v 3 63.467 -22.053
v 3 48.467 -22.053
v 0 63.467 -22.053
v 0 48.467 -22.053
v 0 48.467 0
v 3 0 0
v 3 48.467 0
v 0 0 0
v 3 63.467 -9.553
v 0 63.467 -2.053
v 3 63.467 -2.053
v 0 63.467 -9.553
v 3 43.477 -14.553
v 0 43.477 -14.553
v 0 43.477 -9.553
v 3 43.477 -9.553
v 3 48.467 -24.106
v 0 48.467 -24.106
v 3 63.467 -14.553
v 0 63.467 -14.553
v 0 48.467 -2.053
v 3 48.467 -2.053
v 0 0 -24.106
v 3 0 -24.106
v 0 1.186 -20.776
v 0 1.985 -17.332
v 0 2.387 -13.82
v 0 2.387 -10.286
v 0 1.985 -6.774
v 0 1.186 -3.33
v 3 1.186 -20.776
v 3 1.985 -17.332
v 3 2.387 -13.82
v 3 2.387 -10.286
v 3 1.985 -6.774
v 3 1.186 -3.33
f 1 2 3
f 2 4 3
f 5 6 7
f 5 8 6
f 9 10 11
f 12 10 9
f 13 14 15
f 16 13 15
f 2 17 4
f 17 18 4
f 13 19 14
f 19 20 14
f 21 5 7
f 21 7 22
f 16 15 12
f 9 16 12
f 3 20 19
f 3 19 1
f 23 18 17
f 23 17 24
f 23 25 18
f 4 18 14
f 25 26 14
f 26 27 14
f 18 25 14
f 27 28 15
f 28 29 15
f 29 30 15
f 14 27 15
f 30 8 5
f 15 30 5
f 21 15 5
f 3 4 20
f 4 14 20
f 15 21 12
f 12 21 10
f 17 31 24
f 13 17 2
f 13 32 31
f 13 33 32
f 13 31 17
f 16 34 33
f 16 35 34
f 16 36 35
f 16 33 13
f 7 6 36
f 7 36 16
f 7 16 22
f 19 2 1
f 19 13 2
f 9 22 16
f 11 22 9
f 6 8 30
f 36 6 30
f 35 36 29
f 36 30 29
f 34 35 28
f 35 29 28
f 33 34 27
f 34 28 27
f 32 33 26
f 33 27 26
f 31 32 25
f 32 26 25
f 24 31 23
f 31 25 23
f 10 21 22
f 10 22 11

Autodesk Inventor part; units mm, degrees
ref_plane "YZ Plane" through (0, 0, 0) normal (1, 0, 0) x (0, 1, 0)
ref_plane "XZ Plane" through (0, 0, 0) normal (0, 1, 0) x (-1, 0, 0)
ref_plane "XY Plane" through (0, 0, 0) normal (0, 0, 1) x (1, 0, 0)
sketch "Sketch1" plane through (0, 0, 0) normal (1, 0, 0) x (0, 1, 0)
  circle A0 centre (-58.6732, 0) radius 31.02 construction
  line L0 (-39.6195, 0) -> (-14.1298, -32.6253) construction
  line L1 (-30.13, -12.146) -> (-30.13, 12.146) construction
  line L2 (0, 0) -> (-214.2426, 0) construction
  line L3 (-30.13, 12.146) -> (-33.107, -11.7755)
  line L4 (-33.107, -11.7755) -> (-30.13, -12.146)
  line L5 (-30.13, -12.146) -> (-27.153, 11.7755)
  line L6 (-27.153, 11.7755) -> (-30.13, 12.146)
  line L7 (-30.13, 12.146) -> (-30.13, -12.146) construction
  line L8 (-33.107, -11.7755) -> (-27.153, 11.7755) construction
  point P0 (-30.13, 0)
  dimension "d0" = 62.04
  dimension "d2" = 52
  dimension "d3" = 24.292
  dimension "d8" = 31.2206
  dimension "d9" = 16.0002
  dimension "d11" = 3
  dimension "d13" = 24.106
sketch "Sketch2" plane through (0, 0, 0) normal (1, 0, 0) x (0, 1, 0)
  line L0 (0, 0) -> (63.4666, 0)
  line L1 (63.4666, 0) -> (63.4666, -24.106)
  line L2 (63.4666, -24.106) -> (0, -24.106)
  line L3 (0, -24.106) -> (0, 0) construction
  line L4 (63.4666, -12.053) -> (-45.5912, -12.053) construction
  arc A0 (0, -24.106) -> (0, 0) centre (-28.5826, -12.053) ccw
  arc A1 (0, 0) -> (0, -24.106) centre (-28.5826, -12.053) ccw construction
  line L5 (80.4558, -9.553) -> (46.4774, -9.553) construction
  line L6 (46.4774, -9.553) -> (46.4774, -14.553) construction
  line L7 (46.4774, -14.553) -> (80.4558, -14.553) construction
  line L8 (80.4558, -14.553) -> (80.4558, -9.553) construction
  line L9 (80.4558, -9.553) -> (46.4774, -14.553) construction
  line L10 (46.4774, -9.553) -> (80.4558, -14.553) construction
  line L11 (43.4774, -9.553) -> (83.4558, -9.553)
  line L12 (83.4558, -9.553) -> (83.4558, -14.553) construction
  line L13 (83.4558, -14.553) -> (43.4774, -14.553)
  line L14 (43.4774, -14.553) -> (43.4774, -9.553)
  line L15 (43.4774, -9.553) -> (83.4558, -14.553) construction
  line L16 (83.4558, -9.553) -> (43.4774, -14.553) construction
  line L17 (78.4666, -26.1591) -> (48.4666, -26.1591)
  line L18 (48.4666, -26.1591) -> (48.4666, -22.053)
  line L19 (48.4666, -22.053) -> (78.4666, -22.053)
  line L20 (78.4666, -22.053) -> (78.4666, -26.1591)
  line L21 (78.4666, -26.1591) -> (48.4666, -22.053) construction
  line L22 (48.4666, -26.1591) -> (78.4666, -22.053) construction
  line L23 (48.4666, 2.053) -> (48.4666, -2.053)
  line L24 (48.4666, -2.053) -> (78.4666, -2.053)
  point P0 (63.4666, -9.553)
  point P1 (63.4666, -2.053)
  point P2 (48.4666, 0)
  point P3 (48.4666, -24.106)
  point P4 (63.4666, -22.053)
  point P5 (63.4666, -14.553)
  dimension "d12" = 24.106
  dimension "d14" = 62.04
  dimension "d15" = 63.4666
  dimension "d17" = 109.0578
  dimension "d18" = 44.04
  dimension "d19" = 5
  dimension "d20" = 3
  dimension "d22" = 30
  dimension "d25" = 20
extrude "Extrusion1" add sketch "Sketch2" along normal blind 3 contours L0 L23 L24 L1 L11 L14 L13 L19 L18 L2 A0
equation "\"d12\" = d13"
properties part number "Paleta" material "Laminate, Navy"
